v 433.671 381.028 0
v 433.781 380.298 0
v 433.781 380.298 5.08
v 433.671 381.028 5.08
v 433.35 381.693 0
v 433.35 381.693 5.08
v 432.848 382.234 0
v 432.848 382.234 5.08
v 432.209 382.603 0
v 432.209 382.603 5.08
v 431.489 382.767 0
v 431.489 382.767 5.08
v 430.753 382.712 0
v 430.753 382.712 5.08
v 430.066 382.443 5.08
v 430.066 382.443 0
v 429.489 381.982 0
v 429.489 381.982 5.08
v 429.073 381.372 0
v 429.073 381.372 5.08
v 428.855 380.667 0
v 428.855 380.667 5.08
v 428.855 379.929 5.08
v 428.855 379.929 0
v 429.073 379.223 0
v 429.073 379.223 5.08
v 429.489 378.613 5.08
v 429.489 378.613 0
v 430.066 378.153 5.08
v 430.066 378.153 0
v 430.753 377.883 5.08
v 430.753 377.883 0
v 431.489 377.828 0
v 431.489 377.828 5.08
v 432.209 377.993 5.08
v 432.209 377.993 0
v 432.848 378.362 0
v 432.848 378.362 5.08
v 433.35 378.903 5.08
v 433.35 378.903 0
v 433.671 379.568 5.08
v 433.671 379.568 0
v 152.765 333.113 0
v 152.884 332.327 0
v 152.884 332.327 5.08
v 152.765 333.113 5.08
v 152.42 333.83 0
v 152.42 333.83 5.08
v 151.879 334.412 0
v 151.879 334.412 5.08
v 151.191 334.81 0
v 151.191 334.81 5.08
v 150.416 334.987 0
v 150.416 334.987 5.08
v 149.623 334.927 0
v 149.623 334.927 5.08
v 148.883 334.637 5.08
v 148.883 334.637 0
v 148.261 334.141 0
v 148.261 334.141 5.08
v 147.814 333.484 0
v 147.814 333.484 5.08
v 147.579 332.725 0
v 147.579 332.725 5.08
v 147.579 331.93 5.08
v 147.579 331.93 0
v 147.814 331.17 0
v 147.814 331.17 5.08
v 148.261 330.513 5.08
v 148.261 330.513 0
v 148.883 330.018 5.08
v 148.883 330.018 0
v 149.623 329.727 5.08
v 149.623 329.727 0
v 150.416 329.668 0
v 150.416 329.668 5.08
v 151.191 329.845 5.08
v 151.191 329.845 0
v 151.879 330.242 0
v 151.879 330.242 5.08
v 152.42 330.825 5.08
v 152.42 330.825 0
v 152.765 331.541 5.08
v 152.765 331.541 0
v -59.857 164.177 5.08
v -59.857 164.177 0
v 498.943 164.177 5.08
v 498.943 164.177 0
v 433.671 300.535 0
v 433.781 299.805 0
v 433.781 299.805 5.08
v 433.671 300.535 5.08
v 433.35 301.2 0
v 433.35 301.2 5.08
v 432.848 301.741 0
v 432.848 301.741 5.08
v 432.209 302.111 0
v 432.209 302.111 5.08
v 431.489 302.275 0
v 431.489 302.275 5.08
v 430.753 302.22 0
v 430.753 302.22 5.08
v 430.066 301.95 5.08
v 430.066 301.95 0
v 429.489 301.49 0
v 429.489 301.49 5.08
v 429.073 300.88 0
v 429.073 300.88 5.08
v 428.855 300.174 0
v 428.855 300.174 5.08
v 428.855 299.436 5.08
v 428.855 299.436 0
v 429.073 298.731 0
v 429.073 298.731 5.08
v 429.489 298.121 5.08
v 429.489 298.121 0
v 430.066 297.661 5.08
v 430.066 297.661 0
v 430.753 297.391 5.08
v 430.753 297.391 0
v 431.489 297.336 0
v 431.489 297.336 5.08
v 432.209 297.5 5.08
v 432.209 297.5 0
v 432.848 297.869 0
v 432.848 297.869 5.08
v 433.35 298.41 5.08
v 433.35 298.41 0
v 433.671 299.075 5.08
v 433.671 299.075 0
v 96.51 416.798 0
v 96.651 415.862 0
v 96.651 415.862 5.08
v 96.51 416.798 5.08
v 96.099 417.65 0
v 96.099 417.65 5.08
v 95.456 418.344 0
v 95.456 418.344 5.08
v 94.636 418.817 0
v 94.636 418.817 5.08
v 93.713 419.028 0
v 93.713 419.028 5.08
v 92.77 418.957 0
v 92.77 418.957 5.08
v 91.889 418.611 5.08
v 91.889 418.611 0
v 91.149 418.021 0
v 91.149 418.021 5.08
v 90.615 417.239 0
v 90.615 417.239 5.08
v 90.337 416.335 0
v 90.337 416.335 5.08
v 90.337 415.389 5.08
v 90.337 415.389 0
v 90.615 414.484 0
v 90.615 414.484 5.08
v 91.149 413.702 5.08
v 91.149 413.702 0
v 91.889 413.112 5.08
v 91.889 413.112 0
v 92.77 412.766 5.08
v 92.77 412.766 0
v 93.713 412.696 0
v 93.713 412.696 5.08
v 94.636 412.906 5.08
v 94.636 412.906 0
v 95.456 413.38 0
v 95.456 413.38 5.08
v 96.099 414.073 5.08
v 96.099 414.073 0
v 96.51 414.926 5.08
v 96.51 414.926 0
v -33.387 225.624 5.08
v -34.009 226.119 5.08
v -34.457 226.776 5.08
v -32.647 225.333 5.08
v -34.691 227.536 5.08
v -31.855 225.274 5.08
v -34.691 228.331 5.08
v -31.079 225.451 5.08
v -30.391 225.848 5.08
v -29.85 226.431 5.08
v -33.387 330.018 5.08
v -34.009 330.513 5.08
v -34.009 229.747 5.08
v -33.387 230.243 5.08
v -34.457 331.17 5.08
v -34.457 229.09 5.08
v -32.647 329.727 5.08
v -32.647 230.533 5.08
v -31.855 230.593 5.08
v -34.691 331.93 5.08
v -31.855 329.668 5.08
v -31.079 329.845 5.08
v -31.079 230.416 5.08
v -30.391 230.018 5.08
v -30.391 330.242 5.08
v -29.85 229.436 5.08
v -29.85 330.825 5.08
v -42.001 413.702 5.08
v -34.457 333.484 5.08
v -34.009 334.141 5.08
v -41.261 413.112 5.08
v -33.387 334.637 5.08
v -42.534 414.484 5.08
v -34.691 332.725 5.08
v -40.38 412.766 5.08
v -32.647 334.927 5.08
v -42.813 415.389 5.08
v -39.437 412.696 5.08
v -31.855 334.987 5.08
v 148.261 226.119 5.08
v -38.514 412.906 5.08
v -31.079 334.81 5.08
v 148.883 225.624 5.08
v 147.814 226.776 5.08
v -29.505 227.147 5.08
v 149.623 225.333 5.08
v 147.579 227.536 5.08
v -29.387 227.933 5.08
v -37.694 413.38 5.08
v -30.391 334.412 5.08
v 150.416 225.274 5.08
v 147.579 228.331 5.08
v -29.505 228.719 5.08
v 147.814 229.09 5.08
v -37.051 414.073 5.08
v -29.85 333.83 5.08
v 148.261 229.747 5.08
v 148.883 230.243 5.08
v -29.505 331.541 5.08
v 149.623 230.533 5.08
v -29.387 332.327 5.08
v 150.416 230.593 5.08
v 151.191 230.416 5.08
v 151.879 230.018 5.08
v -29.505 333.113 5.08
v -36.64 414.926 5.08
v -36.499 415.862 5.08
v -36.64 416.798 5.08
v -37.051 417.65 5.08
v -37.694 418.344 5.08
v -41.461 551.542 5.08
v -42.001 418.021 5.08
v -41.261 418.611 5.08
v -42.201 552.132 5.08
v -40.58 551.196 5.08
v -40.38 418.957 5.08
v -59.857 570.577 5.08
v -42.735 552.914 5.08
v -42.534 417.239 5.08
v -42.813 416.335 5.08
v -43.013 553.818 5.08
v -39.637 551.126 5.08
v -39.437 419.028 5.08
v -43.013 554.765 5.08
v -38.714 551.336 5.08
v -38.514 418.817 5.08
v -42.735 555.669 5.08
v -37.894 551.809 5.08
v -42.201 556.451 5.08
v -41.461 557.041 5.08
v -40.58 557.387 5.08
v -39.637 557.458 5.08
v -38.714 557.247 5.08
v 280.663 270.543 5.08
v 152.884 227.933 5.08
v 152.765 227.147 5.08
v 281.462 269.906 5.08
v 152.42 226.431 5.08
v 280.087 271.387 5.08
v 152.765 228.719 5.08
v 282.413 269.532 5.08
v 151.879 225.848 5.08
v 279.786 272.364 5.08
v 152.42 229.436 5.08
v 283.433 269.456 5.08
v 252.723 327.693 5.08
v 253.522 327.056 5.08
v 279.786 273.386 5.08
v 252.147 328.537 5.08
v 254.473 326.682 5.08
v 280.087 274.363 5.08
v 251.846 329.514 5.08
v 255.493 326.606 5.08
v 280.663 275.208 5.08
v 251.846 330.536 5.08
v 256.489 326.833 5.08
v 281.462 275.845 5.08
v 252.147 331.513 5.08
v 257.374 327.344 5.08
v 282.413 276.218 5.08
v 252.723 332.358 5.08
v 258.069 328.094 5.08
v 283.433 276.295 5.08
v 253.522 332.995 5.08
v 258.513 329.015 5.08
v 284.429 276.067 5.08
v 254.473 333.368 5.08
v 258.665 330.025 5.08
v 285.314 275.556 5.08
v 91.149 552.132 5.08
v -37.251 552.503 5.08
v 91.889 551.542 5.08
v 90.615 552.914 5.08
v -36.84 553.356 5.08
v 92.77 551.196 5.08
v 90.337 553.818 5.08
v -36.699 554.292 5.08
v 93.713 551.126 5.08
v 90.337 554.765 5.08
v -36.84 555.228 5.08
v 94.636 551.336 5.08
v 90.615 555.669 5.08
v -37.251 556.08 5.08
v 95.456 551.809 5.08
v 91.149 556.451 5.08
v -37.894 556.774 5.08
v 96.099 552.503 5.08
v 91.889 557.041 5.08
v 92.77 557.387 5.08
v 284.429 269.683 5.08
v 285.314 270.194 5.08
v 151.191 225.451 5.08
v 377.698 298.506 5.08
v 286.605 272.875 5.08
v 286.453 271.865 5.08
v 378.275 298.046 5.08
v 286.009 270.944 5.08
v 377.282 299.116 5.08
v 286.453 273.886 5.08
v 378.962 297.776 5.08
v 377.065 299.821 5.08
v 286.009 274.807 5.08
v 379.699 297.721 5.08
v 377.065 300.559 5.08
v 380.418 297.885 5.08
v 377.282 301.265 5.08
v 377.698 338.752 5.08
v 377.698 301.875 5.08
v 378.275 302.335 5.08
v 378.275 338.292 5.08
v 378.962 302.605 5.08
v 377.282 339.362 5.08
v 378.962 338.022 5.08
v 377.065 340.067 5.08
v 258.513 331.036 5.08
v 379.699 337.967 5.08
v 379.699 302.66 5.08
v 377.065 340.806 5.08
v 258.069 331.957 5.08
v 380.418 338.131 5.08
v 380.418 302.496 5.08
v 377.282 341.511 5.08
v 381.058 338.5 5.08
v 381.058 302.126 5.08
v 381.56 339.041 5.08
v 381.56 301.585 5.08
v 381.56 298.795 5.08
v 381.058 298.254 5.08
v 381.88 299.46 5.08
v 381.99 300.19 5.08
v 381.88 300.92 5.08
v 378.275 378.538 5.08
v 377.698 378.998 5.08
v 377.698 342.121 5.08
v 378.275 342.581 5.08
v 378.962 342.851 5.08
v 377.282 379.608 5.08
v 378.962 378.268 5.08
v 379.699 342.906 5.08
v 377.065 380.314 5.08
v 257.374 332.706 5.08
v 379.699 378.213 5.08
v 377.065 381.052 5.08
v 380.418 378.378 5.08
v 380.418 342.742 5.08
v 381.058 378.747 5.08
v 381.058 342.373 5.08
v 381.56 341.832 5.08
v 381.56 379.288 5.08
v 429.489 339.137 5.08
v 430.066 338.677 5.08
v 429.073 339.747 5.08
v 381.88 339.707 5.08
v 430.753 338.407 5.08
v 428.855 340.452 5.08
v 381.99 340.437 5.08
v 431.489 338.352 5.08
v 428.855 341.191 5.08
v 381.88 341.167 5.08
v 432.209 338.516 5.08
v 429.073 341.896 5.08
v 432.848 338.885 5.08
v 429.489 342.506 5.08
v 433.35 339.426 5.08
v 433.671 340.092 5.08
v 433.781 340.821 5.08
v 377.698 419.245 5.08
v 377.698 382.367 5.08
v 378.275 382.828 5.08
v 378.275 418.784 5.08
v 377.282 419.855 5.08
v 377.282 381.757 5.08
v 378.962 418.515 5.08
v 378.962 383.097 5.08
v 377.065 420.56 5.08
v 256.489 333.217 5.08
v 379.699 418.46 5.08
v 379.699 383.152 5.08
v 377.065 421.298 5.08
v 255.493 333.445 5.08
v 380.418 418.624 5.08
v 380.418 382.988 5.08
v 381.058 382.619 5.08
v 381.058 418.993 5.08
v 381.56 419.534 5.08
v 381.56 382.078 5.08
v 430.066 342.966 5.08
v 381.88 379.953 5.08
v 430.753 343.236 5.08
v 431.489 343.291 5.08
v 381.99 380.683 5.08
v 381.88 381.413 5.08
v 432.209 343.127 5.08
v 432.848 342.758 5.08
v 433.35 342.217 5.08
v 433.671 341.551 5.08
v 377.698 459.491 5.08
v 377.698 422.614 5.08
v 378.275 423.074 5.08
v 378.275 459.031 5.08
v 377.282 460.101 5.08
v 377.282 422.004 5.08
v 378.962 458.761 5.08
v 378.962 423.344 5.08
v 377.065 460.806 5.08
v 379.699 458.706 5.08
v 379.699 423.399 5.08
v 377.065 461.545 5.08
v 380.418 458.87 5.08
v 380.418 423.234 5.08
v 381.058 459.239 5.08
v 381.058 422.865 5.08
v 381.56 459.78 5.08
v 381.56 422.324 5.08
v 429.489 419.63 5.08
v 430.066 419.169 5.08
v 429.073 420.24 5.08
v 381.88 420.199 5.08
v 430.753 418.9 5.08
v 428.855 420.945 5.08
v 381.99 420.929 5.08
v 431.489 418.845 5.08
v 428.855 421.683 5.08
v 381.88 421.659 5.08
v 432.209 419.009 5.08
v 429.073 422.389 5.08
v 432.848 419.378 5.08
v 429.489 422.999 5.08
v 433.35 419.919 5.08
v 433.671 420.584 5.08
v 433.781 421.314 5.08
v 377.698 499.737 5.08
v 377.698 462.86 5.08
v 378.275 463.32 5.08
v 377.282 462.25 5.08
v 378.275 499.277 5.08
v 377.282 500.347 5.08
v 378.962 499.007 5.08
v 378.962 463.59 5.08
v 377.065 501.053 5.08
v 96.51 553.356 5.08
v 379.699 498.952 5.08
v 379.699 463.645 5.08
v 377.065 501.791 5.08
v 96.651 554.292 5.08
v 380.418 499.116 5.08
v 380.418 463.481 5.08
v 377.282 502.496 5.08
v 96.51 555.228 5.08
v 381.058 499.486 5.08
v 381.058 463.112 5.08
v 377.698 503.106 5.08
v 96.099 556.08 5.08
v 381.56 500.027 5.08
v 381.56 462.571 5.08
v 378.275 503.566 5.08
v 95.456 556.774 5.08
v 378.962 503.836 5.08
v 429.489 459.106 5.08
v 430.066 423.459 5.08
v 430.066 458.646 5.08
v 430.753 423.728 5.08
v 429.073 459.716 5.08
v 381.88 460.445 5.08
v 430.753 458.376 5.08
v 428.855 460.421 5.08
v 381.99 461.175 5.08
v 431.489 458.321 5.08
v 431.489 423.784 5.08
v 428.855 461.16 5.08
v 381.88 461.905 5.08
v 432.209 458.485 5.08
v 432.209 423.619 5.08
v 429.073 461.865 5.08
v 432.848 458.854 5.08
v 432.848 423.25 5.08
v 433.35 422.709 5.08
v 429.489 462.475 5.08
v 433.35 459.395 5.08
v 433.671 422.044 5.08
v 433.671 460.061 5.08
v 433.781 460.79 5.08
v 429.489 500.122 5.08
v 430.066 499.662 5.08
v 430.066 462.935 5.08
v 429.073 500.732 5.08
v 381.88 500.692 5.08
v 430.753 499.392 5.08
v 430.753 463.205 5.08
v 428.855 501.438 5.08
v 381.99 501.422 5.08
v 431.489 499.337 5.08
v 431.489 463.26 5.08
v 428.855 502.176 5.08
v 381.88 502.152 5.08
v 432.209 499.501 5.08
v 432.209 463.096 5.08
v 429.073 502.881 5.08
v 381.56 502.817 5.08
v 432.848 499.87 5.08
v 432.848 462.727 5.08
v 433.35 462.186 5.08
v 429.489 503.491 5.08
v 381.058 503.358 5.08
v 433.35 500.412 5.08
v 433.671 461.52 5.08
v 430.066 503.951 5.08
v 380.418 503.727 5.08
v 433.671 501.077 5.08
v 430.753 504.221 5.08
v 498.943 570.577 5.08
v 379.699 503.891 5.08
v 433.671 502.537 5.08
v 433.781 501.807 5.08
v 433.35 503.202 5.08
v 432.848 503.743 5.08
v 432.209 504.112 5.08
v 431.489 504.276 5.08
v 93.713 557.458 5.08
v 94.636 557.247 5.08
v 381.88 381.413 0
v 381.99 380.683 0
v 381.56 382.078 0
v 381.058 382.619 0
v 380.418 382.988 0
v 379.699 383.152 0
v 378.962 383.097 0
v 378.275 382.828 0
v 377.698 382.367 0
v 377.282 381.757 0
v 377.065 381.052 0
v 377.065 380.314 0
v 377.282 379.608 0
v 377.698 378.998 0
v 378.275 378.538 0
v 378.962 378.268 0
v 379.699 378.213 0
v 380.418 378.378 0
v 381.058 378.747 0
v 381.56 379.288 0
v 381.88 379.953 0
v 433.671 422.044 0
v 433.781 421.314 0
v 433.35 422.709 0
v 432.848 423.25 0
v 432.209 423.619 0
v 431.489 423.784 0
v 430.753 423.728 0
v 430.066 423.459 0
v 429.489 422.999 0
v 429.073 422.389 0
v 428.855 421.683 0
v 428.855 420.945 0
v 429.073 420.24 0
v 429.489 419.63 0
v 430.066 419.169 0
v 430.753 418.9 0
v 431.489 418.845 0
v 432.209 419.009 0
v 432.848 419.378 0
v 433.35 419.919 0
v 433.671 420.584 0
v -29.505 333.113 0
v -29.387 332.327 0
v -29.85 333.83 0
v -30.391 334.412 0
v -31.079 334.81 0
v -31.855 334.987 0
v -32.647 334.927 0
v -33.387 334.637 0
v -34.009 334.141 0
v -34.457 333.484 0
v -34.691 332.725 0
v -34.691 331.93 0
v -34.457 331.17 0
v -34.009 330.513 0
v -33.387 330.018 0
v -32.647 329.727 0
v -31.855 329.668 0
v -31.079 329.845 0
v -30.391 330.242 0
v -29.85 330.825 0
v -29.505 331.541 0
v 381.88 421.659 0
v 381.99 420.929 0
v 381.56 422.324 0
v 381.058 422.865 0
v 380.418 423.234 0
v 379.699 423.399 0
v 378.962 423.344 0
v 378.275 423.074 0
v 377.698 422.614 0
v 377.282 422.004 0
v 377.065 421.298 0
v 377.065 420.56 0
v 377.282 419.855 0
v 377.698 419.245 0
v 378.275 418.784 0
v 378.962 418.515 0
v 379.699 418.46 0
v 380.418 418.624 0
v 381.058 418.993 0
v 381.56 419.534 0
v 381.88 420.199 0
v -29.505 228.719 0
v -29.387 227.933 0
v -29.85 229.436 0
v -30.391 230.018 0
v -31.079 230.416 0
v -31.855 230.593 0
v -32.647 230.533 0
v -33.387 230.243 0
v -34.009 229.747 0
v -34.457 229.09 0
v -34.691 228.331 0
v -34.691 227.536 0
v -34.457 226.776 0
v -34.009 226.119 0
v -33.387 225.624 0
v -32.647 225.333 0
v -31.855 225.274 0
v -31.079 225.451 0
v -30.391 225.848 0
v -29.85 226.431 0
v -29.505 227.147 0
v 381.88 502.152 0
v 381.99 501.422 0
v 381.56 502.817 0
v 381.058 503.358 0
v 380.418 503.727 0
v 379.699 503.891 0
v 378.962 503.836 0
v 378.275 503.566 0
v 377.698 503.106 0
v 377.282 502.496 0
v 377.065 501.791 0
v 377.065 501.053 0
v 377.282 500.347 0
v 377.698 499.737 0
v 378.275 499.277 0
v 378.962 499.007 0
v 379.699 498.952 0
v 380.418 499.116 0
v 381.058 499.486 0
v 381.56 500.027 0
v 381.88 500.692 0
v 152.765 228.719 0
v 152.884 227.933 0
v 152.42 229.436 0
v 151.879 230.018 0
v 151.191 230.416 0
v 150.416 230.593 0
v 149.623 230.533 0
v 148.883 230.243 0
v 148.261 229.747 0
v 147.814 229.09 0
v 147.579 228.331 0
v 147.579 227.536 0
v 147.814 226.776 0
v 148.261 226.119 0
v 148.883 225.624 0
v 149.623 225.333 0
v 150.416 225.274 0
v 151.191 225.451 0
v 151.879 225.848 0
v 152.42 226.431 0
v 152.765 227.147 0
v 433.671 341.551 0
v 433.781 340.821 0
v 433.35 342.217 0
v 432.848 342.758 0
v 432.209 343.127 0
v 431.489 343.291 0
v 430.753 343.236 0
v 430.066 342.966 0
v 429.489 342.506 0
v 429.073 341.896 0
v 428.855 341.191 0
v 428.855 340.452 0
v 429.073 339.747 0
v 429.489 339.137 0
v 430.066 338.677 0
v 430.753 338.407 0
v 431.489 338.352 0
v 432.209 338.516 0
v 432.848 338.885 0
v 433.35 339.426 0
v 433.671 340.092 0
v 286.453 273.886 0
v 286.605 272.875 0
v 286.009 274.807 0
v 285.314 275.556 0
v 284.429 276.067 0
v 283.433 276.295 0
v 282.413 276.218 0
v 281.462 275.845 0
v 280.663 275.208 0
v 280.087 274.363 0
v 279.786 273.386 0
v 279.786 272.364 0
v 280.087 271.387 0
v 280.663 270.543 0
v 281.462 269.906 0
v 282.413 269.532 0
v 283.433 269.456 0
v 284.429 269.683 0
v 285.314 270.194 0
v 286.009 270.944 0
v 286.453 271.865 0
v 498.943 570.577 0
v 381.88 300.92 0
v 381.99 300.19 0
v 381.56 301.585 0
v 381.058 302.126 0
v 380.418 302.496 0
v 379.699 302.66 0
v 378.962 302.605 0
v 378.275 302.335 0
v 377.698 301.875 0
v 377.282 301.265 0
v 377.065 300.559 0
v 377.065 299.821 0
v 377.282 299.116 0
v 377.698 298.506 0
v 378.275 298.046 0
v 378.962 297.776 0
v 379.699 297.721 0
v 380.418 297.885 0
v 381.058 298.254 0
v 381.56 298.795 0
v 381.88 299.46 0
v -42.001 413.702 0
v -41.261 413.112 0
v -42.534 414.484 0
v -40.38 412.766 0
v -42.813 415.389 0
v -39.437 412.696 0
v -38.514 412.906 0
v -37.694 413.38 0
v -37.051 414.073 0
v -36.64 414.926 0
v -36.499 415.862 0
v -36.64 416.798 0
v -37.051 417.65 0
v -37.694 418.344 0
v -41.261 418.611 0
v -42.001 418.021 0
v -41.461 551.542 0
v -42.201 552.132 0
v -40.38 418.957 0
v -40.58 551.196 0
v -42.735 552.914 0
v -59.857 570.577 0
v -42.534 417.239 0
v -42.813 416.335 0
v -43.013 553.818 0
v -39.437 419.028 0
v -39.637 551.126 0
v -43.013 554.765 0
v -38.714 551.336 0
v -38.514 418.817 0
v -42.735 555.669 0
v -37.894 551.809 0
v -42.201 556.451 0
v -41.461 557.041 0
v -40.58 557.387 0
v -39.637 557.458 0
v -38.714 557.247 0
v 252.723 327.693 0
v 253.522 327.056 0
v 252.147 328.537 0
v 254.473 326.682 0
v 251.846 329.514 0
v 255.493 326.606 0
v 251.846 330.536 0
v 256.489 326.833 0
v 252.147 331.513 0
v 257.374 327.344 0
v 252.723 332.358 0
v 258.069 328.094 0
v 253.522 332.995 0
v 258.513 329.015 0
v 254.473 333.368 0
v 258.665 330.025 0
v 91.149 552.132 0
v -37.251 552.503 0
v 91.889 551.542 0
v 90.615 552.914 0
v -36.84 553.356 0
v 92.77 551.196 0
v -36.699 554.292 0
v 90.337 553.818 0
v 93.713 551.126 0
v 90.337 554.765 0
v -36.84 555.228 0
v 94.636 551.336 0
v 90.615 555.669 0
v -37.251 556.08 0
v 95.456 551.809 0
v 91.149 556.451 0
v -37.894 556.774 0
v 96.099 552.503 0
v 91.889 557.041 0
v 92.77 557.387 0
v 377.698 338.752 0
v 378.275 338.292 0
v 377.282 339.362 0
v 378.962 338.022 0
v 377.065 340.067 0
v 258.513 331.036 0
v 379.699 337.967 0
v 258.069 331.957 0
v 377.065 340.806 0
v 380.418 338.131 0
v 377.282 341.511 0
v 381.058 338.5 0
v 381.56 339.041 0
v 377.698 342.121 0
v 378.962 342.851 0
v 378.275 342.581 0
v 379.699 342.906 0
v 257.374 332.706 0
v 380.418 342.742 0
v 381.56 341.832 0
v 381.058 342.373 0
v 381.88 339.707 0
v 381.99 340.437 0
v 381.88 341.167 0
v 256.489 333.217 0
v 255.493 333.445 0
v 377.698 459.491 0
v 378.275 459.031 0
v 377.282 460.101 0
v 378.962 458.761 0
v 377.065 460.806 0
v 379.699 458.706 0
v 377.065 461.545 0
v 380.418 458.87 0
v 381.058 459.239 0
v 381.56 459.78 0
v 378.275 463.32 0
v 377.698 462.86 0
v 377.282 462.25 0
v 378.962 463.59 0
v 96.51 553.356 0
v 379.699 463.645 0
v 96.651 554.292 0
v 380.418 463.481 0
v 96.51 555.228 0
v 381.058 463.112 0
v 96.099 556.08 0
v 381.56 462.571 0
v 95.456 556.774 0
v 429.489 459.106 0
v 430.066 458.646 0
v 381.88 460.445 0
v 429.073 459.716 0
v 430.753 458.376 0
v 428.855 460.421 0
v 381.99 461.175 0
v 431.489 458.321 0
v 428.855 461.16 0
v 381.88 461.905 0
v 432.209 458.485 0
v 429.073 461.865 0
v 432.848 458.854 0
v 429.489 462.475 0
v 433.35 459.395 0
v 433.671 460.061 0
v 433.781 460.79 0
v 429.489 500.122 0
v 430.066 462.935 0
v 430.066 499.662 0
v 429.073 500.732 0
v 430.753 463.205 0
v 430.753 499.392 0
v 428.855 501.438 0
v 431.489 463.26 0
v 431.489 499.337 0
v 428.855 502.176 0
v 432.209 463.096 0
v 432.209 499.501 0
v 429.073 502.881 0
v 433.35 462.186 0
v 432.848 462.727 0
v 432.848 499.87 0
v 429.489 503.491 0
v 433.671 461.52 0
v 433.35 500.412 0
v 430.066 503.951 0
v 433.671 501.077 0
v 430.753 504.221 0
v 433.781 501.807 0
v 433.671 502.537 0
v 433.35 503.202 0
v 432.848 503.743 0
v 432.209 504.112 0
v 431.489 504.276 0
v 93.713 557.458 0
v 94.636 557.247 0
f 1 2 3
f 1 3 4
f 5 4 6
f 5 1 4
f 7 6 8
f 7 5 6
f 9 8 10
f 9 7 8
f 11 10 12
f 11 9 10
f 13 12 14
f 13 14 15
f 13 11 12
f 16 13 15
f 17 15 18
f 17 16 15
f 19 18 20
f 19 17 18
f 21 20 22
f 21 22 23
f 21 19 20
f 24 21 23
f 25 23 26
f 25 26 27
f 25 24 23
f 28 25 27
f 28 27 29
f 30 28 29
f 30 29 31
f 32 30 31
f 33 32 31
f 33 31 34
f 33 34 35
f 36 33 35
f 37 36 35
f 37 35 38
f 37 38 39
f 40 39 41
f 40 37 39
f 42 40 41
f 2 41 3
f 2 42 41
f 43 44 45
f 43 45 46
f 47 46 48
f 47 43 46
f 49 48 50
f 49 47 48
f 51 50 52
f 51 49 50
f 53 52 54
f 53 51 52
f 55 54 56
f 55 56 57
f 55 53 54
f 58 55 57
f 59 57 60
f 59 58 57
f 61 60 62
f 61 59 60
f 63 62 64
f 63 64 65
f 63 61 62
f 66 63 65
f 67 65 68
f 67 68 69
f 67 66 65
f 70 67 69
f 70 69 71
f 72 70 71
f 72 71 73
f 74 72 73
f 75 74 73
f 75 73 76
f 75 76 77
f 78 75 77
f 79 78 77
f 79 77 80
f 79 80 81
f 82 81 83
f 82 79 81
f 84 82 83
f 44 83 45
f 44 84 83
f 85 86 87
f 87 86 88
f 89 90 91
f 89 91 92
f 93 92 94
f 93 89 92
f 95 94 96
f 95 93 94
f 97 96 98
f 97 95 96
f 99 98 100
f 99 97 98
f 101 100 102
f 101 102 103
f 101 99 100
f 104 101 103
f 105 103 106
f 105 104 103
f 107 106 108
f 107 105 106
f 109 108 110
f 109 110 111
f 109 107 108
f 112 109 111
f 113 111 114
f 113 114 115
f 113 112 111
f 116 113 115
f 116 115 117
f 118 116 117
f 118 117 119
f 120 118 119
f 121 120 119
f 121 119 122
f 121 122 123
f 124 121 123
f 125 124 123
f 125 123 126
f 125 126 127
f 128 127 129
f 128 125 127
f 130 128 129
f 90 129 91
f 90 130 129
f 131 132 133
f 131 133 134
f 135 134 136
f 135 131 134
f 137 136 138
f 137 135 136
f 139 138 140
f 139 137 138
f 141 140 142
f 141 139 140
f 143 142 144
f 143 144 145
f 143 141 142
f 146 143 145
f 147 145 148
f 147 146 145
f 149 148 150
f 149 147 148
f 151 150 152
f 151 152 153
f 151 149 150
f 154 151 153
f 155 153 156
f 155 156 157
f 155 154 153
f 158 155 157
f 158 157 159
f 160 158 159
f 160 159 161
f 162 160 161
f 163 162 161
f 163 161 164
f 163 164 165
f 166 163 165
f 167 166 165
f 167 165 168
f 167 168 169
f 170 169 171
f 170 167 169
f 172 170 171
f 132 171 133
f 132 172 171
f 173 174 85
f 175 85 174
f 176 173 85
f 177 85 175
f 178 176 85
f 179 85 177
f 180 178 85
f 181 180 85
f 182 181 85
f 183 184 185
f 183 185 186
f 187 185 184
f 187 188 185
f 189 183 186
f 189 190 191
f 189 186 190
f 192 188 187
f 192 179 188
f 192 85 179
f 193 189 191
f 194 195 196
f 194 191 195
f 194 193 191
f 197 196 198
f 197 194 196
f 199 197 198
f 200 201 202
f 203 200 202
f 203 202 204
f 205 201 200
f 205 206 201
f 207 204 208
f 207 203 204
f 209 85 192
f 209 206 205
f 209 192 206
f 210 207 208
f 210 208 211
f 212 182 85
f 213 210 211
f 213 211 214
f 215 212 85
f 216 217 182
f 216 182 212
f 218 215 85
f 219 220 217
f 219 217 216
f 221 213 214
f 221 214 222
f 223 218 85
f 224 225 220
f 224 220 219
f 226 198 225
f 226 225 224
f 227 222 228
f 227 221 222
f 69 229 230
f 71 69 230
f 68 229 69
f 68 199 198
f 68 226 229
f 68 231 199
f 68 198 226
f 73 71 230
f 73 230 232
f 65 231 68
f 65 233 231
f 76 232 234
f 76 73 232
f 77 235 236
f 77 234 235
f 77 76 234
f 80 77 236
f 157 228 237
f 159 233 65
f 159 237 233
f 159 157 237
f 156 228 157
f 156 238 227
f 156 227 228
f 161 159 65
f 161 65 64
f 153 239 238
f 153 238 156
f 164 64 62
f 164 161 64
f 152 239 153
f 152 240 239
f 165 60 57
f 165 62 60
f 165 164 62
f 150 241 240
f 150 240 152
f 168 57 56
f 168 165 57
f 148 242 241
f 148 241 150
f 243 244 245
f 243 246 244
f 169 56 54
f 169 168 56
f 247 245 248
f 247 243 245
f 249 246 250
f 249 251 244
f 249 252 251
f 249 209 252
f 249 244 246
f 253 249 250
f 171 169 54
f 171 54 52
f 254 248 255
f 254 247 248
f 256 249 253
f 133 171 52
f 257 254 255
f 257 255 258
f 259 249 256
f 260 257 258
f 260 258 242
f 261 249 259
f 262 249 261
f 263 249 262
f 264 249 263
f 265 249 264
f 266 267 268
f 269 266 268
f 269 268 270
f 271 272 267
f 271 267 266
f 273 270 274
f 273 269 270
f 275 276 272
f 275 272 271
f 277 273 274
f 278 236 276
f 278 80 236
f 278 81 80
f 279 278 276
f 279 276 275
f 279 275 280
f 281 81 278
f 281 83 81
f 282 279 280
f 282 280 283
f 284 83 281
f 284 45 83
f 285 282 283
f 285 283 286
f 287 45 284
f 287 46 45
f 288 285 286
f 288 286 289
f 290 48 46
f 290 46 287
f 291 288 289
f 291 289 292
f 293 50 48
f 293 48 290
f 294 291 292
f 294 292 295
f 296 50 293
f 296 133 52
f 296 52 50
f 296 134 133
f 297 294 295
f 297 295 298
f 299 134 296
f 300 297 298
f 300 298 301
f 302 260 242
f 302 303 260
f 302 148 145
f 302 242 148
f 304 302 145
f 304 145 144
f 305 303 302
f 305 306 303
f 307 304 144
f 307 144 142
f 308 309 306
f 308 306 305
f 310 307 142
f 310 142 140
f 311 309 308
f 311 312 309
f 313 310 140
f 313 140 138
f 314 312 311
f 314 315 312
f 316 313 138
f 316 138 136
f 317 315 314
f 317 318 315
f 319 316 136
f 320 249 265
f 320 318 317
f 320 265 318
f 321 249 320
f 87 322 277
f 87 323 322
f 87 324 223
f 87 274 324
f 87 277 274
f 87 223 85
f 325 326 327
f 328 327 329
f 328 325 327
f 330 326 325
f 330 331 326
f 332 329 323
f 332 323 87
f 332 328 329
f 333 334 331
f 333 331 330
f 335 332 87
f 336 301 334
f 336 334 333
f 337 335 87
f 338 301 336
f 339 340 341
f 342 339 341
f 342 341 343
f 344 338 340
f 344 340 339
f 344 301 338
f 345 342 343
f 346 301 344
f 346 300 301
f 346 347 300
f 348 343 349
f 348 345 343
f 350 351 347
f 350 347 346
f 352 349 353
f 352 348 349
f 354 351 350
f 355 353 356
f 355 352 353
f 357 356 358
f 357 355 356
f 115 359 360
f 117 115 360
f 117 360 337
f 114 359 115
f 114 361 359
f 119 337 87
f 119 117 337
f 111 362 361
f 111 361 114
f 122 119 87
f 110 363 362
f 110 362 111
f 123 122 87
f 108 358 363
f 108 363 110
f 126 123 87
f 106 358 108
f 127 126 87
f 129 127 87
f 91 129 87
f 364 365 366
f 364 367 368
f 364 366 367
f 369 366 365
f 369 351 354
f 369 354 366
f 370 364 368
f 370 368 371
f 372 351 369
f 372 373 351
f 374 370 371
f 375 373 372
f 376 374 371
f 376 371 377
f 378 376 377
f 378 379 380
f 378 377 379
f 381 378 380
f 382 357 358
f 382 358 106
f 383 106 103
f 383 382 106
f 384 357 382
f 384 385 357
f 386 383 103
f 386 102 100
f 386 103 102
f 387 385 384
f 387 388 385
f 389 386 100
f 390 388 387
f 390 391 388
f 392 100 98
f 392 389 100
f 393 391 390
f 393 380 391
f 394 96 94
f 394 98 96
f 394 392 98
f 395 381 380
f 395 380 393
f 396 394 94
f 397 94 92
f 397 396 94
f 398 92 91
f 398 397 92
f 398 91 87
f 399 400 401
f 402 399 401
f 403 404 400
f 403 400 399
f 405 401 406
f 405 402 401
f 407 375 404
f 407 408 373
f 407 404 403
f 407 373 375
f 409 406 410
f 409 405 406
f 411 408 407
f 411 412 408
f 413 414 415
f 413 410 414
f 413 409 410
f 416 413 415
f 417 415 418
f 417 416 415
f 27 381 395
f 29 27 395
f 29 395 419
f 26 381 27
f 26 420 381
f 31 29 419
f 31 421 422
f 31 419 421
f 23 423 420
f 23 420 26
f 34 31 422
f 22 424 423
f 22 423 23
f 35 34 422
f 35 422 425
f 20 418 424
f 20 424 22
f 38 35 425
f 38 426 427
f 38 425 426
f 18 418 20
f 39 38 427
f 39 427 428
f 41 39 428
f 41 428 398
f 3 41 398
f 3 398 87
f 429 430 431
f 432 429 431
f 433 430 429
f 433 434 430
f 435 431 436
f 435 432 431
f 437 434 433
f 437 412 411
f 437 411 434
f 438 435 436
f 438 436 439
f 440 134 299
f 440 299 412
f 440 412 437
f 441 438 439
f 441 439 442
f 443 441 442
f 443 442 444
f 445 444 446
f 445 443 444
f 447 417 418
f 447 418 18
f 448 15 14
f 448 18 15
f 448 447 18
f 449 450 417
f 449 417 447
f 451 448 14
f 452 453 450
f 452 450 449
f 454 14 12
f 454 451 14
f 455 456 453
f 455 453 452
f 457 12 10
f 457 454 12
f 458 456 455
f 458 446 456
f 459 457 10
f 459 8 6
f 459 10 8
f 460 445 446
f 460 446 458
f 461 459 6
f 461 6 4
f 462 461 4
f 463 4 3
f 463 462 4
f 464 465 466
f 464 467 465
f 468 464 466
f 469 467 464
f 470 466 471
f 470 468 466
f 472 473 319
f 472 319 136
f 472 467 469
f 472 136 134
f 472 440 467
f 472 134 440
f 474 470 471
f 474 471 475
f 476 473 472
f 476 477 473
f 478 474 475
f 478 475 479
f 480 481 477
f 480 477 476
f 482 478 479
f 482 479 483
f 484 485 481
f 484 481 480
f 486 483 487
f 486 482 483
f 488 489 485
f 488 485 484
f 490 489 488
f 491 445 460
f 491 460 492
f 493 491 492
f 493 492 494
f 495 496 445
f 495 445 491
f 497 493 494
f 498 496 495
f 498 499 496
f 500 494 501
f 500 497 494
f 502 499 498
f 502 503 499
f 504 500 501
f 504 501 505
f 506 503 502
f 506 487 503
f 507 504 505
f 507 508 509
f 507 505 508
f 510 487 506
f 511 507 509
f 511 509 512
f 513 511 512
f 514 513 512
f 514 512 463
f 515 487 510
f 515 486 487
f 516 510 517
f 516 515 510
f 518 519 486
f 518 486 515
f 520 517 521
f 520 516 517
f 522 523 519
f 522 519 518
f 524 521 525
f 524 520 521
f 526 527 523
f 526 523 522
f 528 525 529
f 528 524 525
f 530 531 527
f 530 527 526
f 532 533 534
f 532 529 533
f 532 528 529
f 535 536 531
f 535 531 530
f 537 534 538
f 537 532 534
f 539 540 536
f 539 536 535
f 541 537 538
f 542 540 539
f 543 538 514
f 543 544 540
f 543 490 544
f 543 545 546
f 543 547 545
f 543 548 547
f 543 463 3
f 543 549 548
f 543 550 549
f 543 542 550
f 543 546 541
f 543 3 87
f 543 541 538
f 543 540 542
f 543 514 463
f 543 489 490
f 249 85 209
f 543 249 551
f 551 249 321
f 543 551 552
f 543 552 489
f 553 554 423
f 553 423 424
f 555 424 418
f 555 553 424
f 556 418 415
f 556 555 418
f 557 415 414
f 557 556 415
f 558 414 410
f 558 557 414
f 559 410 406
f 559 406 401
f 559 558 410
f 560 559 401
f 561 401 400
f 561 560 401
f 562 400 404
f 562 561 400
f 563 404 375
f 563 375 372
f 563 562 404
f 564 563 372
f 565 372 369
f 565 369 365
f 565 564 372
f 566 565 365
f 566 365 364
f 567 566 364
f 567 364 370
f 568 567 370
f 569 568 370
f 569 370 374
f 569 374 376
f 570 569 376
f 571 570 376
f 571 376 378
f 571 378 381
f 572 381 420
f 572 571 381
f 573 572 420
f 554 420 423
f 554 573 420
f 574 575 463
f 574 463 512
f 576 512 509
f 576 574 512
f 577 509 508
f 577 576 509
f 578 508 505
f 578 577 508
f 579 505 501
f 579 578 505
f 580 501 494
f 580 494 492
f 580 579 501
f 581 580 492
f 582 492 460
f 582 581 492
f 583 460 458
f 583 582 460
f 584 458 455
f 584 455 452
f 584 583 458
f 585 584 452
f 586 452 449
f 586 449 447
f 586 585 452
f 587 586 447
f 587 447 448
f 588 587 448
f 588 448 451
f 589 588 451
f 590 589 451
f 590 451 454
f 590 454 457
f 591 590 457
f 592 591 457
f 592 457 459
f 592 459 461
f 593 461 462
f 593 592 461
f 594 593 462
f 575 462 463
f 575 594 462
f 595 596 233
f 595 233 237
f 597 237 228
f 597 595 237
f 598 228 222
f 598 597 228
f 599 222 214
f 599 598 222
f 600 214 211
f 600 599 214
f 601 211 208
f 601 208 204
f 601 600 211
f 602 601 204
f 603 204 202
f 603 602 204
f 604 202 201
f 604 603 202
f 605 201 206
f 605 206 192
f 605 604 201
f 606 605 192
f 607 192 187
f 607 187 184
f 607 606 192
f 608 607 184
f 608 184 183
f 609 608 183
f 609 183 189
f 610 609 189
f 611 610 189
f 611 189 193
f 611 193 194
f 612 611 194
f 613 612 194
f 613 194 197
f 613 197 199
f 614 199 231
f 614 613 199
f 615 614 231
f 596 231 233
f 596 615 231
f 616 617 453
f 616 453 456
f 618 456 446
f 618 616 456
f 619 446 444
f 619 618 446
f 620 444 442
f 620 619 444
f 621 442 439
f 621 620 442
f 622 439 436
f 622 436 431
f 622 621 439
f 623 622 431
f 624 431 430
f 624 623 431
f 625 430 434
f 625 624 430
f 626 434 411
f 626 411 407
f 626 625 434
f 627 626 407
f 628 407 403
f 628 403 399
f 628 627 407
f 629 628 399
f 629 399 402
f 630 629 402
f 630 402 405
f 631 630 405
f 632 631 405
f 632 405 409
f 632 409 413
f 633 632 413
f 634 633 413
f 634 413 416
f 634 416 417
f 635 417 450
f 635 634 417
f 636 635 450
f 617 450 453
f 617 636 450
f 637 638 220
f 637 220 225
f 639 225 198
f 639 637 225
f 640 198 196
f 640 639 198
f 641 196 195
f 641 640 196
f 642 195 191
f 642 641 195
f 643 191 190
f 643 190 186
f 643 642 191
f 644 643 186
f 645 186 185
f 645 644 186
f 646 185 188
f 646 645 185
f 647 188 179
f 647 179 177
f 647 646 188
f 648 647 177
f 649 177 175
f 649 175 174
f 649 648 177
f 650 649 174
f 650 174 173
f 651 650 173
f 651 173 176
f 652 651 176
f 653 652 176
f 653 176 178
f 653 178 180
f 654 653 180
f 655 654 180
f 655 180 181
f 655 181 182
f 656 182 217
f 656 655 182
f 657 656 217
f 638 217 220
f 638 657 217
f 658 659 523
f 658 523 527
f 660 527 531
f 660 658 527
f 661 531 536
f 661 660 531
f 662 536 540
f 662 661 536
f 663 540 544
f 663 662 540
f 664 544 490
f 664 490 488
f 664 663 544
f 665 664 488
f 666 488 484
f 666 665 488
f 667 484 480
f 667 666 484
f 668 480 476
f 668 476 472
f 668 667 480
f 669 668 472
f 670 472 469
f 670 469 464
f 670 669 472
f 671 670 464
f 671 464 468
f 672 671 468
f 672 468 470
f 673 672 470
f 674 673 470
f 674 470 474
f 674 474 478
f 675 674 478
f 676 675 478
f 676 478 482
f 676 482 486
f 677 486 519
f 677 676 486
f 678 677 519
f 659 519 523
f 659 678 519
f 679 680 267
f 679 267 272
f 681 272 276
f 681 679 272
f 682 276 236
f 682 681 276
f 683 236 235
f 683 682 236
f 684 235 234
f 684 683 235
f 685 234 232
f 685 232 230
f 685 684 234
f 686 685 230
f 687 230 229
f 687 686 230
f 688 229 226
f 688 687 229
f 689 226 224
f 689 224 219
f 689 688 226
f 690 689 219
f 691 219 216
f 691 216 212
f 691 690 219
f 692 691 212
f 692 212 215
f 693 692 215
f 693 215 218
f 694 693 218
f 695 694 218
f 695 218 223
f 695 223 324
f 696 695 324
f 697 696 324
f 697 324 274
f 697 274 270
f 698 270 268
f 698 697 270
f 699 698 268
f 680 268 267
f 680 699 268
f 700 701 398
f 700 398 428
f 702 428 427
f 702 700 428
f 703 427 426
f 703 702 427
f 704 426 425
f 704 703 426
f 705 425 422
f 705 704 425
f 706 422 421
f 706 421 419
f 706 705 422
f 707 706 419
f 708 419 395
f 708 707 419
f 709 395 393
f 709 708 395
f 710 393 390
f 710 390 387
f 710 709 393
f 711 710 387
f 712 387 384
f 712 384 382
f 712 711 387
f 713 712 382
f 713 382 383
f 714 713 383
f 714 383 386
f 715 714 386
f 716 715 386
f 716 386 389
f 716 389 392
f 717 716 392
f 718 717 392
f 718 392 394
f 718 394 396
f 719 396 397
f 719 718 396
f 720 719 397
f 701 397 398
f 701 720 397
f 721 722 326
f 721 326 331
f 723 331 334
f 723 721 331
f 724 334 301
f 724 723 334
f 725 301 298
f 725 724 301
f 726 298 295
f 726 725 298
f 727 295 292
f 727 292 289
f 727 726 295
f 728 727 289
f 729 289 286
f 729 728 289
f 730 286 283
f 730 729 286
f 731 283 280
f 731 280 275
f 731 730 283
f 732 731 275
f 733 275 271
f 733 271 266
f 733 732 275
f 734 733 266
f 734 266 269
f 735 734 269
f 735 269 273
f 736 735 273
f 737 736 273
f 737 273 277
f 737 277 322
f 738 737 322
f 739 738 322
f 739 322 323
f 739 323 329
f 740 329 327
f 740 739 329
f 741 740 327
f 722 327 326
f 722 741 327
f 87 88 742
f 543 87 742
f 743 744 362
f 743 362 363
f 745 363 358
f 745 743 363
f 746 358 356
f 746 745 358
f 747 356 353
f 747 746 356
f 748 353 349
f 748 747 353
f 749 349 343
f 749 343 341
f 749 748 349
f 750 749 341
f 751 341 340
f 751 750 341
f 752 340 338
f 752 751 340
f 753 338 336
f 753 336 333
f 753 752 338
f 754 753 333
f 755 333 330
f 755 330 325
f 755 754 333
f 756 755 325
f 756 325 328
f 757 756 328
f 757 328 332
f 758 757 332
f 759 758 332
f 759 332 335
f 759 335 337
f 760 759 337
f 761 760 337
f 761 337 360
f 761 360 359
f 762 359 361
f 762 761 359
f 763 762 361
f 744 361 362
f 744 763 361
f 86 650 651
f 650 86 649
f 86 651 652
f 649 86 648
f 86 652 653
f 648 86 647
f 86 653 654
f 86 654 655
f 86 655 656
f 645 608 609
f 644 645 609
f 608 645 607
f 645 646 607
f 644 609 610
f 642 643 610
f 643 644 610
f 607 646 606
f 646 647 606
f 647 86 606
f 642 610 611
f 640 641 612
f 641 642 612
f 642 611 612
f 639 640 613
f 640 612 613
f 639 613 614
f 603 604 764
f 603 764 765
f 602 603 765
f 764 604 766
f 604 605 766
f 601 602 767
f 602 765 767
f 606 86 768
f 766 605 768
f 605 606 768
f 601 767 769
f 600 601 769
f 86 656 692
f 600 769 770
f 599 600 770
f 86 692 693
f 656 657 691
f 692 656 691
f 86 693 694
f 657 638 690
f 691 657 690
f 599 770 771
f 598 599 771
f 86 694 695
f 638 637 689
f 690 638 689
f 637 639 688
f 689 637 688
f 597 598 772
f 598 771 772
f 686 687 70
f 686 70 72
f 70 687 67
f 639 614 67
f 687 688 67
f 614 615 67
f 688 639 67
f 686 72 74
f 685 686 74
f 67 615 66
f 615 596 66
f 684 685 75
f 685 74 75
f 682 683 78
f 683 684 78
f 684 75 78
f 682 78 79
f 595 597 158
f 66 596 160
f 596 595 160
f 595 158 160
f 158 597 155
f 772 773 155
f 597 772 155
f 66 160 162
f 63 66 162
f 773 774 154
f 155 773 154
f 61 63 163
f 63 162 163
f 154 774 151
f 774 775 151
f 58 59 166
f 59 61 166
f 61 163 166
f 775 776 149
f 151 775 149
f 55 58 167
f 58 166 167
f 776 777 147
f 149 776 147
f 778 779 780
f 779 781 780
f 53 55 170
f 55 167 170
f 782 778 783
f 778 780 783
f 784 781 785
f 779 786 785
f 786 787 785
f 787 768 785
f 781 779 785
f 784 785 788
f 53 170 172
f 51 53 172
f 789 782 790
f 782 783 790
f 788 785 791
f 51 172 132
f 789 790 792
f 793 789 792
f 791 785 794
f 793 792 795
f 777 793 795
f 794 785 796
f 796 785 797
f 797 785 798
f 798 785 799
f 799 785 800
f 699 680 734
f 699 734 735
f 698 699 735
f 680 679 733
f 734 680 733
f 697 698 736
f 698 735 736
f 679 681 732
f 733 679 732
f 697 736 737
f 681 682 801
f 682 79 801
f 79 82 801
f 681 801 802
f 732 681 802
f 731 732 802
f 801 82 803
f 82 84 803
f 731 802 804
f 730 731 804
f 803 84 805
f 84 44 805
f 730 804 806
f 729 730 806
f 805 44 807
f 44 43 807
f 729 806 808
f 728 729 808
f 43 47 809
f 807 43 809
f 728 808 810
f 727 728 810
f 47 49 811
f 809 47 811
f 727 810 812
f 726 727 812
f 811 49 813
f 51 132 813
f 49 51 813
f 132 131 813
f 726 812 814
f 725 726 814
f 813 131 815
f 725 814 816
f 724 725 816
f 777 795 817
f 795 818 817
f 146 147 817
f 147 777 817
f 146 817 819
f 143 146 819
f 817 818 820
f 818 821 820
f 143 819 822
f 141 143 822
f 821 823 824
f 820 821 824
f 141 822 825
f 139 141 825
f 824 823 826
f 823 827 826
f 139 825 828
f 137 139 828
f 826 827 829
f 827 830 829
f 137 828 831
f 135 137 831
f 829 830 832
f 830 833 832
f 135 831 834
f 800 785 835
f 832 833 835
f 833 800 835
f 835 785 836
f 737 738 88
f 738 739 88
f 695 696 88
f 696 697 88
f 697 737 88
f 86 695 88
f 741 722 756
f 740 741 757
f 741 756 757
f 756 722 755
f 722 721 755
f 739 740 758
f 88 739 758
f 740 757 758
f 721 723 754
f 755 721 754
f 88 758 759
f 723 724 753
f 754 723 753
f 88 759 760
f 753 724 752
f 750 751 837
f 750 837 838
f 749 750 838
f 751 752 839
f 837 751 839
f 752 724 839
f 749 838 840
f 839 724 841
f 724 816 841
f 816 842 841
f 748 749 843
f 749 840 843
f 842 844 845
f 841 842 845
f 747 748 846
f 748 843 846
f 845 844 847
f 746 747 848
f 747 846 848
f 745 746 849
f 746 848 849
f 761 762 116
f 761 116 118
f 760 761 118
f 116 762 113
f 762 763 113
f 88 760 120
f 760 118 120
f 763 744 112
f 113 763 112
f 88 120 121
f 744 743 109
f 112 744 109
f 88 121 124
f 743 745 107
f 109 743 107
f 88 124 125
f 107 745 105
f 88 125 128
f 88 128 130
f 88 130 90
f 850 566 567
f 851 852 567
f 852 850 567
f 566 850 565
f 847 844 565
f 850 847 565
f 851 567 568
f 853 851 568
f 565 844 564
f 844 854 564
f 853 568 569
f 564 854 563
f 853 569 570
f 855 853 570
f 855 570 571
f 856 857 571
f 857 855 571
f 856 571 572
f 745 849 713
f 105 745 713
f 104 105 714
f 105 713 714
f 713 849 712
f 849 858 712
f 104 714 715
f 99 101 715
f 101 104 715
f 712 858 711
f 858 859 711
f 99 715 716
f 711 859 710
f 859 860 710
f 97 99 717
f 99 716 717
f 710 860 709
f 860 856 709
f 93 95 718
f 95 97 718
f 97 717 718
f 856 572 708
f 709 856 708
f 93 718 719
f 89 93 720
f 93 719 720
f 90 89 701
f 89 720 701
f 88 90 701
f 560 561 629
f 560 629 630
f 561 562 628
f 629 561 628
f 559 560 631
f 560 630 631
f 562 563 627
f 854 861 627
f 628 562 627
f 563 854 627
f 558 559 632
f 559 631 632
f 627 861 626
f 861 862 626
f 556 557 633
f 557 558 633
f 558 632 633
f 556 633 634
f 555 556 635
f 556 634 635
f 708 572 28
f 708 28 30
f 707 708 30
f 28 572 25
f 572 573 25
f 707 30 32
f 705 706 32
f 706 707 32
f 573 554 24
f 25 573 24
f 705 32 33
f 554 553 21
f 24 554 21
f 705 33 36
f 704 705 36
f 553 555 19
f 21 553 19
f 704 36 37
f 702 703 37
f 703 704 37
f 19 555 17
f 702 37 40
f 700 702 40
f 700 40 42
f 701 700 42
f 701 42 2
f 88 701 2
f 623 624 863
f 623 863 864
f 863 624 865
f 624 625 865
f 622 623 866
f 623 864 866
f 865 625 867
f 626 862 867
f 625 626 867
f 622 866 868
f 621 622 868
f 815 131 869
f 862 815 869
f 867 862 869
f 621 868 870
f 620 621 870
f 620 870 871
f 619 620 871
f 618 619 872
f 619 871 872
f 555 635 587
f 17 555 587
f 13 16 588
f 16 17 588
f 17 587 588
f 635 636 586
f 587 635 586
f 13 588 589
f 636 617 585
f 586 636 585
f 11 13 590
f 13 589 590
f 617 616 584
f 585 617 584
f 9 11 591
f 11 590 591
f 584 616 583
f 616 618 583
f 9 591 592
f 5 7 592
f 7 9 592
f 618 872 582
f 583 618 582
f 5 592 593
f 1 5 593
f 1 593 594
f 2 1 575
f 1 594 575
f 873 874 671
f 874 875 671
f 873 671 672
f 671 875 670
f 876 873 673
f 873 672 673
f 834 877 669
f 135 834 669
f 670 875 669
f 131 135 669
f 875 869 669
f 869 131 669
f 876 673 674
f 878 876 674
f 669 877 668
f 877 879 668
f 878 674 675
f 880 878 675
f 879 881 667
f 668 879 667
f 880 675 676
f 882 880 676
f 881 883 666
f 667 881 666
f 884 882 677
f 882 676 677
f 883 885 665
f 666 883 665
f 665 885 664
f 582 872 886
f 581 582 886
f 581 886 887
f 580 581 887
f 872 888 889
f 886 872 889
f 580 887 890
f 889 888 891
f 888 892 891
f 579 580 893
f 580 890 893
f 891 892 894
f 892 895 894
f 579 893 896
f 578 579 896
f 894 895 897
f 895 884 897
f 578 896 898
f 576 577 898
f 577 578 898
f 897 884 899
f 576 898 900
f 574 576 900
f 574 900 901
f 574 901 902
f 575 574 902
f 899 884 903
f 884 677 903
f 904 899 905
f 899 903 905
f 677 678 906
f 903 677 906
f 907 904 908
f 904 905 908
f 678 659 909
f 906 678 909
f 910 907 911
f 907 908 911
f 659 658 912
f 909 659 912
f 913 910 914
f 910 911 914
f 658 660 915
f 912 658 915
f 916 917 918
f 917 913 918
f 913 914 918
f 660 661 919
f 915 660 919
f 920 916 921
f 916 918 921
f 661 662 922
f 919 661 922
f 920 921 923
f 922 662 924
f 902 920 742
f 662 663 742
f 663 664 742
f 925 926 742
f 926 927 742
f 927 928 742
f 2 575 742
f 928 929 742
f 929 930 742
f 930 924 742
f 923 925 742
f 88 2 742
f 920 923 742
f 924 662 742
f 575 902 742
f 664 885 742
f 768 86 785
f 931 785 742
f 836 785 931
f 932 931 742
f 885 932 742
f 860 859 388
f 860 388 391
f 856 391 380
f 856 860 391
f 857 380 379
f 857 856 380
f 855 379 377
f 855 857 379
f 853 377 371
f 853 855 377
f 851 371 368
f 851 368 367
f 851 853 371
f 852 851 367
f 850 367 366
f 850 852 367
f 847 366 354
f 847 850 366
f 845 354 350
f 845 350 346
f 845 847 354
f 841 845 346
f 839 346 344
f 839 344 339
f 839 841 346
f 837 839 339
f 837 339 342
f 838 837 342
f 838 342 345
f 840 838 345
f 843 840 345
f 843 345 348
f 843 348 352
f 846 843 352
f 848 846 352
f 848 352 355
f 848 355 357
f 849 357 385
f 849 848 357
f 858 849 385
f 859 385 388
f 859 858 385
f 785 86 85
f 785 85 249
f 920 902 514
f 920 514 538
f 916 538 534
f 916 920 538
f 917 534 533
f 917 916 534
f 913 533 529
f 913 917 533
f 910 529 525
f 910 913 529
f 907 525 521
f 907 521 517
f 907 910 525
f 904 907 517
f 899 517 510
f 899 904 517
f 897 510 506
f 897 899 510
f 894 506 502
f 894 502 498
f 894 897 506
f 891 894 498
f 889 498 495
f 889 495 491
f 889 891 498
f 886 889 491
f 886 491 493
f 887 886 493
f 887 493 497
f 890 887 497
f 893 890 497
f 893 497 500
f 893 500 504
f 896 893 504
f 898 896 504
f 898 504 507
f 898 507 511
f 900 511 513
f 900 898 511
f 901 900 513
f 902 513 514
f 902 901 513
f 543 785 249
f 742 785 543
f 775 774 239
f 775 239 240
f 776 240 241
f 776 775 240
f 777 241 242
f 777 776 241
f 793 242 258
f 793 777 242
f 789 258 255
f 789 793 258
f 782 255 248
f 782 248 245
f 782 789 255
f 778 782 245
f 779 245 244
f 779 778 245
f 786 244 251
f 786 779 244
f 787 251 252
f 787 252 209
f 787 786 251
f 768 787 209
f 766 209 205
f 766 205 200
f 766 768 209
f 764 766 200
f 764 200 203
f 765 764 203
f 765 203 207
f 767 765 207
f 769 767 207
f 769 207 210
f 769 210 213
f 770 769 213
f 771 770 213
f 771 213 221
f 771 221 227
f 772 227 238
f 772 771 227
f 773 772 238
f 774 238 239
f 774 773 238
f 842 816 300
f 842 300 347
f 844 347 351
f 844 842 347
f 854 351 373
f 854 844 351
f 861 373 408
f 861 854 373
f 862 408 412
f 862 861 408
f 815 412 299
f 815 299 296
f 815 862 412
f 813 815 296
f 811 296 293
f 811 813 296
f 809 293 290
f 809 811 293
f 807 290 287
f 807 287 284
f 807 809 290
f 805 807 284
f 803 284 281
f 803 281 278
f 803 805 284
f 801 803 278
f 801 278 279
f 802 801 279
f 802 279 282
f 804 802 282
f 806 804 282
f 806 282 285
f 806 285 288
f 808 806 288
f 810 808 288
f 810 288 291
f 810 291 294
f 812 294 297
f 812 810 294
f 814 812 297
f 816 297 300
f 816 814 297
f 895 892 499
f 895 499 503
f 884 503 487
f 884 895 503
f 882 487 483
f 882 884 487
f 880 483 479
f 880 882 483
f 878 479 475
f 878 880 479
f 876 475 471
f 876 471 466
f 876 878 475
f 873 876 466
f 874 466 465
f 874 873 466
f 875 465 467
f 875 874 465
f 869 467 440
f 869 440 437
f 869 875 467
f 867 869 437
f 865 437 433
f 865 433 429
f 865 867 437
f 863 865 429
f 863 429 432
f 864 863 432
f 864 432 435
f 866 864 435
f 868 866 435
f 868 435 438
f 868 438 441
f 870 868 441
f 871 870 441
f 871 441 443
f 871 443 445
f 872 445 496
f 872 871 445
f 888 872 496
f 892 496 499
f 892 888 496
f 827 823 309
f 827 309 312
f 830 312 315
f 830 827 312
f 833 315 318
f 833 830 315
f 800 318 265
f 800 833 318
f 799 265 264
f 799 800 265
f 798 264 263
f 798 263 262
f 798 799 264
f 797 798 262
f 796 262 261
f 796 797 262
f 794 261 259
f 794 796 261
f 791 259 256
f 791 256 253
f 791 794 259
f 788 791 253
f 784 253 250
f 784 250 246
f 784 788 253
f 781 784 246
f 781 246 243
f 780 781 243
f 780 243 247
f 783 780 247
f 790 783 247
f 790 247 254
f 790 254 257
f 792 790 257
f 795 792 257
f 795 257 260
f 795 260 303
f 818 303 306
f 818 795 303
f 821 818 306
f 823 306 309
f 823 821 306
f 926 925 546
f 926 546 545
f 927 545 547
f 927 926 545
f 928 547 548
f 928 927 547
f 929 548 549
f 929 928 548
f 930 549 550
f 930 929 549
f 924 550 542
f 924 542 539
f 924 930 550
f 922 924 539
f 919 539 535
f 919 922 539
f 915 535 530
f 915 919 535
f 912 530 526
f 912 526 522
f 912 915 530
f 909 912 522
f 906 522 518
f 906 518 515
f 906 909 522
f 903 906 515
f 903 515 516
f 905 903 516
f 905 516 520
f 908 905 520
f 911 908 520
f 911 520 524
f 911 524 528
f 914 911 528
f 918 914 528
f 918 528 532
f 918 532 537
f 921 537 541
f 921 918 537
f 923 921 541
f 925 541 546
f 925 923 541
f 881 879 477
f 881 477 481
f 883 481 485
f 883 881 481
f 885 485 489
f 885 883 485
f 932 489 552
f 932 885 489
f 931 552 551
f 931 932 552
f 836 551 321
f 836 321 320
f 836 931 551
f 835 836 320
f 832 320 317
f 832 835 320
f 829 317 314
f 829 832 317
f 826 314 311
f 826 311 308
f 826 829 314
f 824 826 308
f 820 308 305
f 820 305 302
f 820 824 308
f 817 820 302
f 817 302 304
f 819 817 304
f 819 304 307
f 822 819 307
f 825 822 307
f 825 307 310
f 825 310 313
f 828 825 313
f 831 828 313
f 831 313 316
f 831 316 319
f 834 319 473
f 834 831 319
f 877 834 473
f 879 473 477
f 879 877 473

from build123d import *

# Parameters (mm, degrees)
F0_W     = 558.8
F0_H     = 406.4
F0_R     = 2.667
F0_R_2   = 3.429
F0_R_3   = 2.4765
F0_R_4   = 3.175
F1_DEPTH = 5.08


with BuildPart() as f1:
    # F0 (on Top) → F1 (new body)
    with BuildSketch(Plane.XY):
        with Locations((219.542896, 367.376714)):
            Rectangle(F0_W, F0_H)
        with Locations((-32.053851, 227.933332)):
            Circle(F0_R, mode=Mode.SUBTRACT)
        with Locations((150.216549, 227.933332)):
            Circle(F0_R, mode=Mode.SUBTRACT)
        with Locations((-32.053851, 332.327332)):
            Circle(F0_R, mode=Mode.SUBTRACT)
        with Locations((150.216549, 332.327332)):
            Circle(F0_R, mode=Mode.SUBTRACT)
        with Locations((283.17628, 272.875279)):
            Circle(F0_R_2, mode=Mode.SUBTRACT)
        with Locations((255.23628, 330.025279)):
            Circle(F0_R_2, mode=Mode.SUBTRACT)
        with Locations((379.513532, 300.19024)):
            Circle(F0_R_3, mode=Mode.SUBTRACT)
        with Locations((431.304132, 299.805289)):
            Circle(F0_R_3, mode=Mode.SUBTRACT)
        with Locations((379.513532, 340.43654)):
            Circle(F0_R_3, mode=Mode.SUBTRACT)
        with Locations((431.304132, 340.821491)):
            Circle(F0_R_3, mode=Mode.SUBTRACT)
        with Locations((-39.673849, 415.86182)):
            Circle(F0_R_4, mode=Mode.SUBTRACT)
        with Locations((93.47605, 415.86182)):
            Circle(F0_R_4, mode=Mode.SUBTRACT)
        with Locations((-39.873949, 554.291675)):
            Circle(F0_R_4, mode=Mode.SUBTRACT)
        with Locations((93.476051, 554.291675)):
            Circle(F0_R_4, mode=Mode.SUBTRACT)
        with Locations((379.513532, 380.68284)):
            Circle(F0_R_3, mode=Mode.SUBTRACT)
        with Locations((431.304132, 380.297889)):
            Circle(F0_R_3, mode=Mode.SUBTRACT)
        with Locations((379.513532, 420.92914)):
            Circle(F0_R_3, mode=Mode.SUBTRACT)
        with Locations((379.513532, 461.17544)):
            Circle(F0_R_3, mode=Mode.SUBTRACT)
        with Locations((431.304132, 421.314091)):
            Circle(F0_R_3, mode=Mode.SUBTRACT)
        with Locations((431.304132, 460.790489)):
            Circle(F0_R_3, mode=Mode.SUBTRACT)
        with Locations((379.513532, 501.42174)):
            Circle(F0_R_3, mode=Mode.SUBTRACT)
        with Locations((431.304132, 501.806691)):
            Circle(F0_R_3, mode=Mode.SUBTRACT)
    extrude(amount=F1_DEPTH)


solid = f1.part
